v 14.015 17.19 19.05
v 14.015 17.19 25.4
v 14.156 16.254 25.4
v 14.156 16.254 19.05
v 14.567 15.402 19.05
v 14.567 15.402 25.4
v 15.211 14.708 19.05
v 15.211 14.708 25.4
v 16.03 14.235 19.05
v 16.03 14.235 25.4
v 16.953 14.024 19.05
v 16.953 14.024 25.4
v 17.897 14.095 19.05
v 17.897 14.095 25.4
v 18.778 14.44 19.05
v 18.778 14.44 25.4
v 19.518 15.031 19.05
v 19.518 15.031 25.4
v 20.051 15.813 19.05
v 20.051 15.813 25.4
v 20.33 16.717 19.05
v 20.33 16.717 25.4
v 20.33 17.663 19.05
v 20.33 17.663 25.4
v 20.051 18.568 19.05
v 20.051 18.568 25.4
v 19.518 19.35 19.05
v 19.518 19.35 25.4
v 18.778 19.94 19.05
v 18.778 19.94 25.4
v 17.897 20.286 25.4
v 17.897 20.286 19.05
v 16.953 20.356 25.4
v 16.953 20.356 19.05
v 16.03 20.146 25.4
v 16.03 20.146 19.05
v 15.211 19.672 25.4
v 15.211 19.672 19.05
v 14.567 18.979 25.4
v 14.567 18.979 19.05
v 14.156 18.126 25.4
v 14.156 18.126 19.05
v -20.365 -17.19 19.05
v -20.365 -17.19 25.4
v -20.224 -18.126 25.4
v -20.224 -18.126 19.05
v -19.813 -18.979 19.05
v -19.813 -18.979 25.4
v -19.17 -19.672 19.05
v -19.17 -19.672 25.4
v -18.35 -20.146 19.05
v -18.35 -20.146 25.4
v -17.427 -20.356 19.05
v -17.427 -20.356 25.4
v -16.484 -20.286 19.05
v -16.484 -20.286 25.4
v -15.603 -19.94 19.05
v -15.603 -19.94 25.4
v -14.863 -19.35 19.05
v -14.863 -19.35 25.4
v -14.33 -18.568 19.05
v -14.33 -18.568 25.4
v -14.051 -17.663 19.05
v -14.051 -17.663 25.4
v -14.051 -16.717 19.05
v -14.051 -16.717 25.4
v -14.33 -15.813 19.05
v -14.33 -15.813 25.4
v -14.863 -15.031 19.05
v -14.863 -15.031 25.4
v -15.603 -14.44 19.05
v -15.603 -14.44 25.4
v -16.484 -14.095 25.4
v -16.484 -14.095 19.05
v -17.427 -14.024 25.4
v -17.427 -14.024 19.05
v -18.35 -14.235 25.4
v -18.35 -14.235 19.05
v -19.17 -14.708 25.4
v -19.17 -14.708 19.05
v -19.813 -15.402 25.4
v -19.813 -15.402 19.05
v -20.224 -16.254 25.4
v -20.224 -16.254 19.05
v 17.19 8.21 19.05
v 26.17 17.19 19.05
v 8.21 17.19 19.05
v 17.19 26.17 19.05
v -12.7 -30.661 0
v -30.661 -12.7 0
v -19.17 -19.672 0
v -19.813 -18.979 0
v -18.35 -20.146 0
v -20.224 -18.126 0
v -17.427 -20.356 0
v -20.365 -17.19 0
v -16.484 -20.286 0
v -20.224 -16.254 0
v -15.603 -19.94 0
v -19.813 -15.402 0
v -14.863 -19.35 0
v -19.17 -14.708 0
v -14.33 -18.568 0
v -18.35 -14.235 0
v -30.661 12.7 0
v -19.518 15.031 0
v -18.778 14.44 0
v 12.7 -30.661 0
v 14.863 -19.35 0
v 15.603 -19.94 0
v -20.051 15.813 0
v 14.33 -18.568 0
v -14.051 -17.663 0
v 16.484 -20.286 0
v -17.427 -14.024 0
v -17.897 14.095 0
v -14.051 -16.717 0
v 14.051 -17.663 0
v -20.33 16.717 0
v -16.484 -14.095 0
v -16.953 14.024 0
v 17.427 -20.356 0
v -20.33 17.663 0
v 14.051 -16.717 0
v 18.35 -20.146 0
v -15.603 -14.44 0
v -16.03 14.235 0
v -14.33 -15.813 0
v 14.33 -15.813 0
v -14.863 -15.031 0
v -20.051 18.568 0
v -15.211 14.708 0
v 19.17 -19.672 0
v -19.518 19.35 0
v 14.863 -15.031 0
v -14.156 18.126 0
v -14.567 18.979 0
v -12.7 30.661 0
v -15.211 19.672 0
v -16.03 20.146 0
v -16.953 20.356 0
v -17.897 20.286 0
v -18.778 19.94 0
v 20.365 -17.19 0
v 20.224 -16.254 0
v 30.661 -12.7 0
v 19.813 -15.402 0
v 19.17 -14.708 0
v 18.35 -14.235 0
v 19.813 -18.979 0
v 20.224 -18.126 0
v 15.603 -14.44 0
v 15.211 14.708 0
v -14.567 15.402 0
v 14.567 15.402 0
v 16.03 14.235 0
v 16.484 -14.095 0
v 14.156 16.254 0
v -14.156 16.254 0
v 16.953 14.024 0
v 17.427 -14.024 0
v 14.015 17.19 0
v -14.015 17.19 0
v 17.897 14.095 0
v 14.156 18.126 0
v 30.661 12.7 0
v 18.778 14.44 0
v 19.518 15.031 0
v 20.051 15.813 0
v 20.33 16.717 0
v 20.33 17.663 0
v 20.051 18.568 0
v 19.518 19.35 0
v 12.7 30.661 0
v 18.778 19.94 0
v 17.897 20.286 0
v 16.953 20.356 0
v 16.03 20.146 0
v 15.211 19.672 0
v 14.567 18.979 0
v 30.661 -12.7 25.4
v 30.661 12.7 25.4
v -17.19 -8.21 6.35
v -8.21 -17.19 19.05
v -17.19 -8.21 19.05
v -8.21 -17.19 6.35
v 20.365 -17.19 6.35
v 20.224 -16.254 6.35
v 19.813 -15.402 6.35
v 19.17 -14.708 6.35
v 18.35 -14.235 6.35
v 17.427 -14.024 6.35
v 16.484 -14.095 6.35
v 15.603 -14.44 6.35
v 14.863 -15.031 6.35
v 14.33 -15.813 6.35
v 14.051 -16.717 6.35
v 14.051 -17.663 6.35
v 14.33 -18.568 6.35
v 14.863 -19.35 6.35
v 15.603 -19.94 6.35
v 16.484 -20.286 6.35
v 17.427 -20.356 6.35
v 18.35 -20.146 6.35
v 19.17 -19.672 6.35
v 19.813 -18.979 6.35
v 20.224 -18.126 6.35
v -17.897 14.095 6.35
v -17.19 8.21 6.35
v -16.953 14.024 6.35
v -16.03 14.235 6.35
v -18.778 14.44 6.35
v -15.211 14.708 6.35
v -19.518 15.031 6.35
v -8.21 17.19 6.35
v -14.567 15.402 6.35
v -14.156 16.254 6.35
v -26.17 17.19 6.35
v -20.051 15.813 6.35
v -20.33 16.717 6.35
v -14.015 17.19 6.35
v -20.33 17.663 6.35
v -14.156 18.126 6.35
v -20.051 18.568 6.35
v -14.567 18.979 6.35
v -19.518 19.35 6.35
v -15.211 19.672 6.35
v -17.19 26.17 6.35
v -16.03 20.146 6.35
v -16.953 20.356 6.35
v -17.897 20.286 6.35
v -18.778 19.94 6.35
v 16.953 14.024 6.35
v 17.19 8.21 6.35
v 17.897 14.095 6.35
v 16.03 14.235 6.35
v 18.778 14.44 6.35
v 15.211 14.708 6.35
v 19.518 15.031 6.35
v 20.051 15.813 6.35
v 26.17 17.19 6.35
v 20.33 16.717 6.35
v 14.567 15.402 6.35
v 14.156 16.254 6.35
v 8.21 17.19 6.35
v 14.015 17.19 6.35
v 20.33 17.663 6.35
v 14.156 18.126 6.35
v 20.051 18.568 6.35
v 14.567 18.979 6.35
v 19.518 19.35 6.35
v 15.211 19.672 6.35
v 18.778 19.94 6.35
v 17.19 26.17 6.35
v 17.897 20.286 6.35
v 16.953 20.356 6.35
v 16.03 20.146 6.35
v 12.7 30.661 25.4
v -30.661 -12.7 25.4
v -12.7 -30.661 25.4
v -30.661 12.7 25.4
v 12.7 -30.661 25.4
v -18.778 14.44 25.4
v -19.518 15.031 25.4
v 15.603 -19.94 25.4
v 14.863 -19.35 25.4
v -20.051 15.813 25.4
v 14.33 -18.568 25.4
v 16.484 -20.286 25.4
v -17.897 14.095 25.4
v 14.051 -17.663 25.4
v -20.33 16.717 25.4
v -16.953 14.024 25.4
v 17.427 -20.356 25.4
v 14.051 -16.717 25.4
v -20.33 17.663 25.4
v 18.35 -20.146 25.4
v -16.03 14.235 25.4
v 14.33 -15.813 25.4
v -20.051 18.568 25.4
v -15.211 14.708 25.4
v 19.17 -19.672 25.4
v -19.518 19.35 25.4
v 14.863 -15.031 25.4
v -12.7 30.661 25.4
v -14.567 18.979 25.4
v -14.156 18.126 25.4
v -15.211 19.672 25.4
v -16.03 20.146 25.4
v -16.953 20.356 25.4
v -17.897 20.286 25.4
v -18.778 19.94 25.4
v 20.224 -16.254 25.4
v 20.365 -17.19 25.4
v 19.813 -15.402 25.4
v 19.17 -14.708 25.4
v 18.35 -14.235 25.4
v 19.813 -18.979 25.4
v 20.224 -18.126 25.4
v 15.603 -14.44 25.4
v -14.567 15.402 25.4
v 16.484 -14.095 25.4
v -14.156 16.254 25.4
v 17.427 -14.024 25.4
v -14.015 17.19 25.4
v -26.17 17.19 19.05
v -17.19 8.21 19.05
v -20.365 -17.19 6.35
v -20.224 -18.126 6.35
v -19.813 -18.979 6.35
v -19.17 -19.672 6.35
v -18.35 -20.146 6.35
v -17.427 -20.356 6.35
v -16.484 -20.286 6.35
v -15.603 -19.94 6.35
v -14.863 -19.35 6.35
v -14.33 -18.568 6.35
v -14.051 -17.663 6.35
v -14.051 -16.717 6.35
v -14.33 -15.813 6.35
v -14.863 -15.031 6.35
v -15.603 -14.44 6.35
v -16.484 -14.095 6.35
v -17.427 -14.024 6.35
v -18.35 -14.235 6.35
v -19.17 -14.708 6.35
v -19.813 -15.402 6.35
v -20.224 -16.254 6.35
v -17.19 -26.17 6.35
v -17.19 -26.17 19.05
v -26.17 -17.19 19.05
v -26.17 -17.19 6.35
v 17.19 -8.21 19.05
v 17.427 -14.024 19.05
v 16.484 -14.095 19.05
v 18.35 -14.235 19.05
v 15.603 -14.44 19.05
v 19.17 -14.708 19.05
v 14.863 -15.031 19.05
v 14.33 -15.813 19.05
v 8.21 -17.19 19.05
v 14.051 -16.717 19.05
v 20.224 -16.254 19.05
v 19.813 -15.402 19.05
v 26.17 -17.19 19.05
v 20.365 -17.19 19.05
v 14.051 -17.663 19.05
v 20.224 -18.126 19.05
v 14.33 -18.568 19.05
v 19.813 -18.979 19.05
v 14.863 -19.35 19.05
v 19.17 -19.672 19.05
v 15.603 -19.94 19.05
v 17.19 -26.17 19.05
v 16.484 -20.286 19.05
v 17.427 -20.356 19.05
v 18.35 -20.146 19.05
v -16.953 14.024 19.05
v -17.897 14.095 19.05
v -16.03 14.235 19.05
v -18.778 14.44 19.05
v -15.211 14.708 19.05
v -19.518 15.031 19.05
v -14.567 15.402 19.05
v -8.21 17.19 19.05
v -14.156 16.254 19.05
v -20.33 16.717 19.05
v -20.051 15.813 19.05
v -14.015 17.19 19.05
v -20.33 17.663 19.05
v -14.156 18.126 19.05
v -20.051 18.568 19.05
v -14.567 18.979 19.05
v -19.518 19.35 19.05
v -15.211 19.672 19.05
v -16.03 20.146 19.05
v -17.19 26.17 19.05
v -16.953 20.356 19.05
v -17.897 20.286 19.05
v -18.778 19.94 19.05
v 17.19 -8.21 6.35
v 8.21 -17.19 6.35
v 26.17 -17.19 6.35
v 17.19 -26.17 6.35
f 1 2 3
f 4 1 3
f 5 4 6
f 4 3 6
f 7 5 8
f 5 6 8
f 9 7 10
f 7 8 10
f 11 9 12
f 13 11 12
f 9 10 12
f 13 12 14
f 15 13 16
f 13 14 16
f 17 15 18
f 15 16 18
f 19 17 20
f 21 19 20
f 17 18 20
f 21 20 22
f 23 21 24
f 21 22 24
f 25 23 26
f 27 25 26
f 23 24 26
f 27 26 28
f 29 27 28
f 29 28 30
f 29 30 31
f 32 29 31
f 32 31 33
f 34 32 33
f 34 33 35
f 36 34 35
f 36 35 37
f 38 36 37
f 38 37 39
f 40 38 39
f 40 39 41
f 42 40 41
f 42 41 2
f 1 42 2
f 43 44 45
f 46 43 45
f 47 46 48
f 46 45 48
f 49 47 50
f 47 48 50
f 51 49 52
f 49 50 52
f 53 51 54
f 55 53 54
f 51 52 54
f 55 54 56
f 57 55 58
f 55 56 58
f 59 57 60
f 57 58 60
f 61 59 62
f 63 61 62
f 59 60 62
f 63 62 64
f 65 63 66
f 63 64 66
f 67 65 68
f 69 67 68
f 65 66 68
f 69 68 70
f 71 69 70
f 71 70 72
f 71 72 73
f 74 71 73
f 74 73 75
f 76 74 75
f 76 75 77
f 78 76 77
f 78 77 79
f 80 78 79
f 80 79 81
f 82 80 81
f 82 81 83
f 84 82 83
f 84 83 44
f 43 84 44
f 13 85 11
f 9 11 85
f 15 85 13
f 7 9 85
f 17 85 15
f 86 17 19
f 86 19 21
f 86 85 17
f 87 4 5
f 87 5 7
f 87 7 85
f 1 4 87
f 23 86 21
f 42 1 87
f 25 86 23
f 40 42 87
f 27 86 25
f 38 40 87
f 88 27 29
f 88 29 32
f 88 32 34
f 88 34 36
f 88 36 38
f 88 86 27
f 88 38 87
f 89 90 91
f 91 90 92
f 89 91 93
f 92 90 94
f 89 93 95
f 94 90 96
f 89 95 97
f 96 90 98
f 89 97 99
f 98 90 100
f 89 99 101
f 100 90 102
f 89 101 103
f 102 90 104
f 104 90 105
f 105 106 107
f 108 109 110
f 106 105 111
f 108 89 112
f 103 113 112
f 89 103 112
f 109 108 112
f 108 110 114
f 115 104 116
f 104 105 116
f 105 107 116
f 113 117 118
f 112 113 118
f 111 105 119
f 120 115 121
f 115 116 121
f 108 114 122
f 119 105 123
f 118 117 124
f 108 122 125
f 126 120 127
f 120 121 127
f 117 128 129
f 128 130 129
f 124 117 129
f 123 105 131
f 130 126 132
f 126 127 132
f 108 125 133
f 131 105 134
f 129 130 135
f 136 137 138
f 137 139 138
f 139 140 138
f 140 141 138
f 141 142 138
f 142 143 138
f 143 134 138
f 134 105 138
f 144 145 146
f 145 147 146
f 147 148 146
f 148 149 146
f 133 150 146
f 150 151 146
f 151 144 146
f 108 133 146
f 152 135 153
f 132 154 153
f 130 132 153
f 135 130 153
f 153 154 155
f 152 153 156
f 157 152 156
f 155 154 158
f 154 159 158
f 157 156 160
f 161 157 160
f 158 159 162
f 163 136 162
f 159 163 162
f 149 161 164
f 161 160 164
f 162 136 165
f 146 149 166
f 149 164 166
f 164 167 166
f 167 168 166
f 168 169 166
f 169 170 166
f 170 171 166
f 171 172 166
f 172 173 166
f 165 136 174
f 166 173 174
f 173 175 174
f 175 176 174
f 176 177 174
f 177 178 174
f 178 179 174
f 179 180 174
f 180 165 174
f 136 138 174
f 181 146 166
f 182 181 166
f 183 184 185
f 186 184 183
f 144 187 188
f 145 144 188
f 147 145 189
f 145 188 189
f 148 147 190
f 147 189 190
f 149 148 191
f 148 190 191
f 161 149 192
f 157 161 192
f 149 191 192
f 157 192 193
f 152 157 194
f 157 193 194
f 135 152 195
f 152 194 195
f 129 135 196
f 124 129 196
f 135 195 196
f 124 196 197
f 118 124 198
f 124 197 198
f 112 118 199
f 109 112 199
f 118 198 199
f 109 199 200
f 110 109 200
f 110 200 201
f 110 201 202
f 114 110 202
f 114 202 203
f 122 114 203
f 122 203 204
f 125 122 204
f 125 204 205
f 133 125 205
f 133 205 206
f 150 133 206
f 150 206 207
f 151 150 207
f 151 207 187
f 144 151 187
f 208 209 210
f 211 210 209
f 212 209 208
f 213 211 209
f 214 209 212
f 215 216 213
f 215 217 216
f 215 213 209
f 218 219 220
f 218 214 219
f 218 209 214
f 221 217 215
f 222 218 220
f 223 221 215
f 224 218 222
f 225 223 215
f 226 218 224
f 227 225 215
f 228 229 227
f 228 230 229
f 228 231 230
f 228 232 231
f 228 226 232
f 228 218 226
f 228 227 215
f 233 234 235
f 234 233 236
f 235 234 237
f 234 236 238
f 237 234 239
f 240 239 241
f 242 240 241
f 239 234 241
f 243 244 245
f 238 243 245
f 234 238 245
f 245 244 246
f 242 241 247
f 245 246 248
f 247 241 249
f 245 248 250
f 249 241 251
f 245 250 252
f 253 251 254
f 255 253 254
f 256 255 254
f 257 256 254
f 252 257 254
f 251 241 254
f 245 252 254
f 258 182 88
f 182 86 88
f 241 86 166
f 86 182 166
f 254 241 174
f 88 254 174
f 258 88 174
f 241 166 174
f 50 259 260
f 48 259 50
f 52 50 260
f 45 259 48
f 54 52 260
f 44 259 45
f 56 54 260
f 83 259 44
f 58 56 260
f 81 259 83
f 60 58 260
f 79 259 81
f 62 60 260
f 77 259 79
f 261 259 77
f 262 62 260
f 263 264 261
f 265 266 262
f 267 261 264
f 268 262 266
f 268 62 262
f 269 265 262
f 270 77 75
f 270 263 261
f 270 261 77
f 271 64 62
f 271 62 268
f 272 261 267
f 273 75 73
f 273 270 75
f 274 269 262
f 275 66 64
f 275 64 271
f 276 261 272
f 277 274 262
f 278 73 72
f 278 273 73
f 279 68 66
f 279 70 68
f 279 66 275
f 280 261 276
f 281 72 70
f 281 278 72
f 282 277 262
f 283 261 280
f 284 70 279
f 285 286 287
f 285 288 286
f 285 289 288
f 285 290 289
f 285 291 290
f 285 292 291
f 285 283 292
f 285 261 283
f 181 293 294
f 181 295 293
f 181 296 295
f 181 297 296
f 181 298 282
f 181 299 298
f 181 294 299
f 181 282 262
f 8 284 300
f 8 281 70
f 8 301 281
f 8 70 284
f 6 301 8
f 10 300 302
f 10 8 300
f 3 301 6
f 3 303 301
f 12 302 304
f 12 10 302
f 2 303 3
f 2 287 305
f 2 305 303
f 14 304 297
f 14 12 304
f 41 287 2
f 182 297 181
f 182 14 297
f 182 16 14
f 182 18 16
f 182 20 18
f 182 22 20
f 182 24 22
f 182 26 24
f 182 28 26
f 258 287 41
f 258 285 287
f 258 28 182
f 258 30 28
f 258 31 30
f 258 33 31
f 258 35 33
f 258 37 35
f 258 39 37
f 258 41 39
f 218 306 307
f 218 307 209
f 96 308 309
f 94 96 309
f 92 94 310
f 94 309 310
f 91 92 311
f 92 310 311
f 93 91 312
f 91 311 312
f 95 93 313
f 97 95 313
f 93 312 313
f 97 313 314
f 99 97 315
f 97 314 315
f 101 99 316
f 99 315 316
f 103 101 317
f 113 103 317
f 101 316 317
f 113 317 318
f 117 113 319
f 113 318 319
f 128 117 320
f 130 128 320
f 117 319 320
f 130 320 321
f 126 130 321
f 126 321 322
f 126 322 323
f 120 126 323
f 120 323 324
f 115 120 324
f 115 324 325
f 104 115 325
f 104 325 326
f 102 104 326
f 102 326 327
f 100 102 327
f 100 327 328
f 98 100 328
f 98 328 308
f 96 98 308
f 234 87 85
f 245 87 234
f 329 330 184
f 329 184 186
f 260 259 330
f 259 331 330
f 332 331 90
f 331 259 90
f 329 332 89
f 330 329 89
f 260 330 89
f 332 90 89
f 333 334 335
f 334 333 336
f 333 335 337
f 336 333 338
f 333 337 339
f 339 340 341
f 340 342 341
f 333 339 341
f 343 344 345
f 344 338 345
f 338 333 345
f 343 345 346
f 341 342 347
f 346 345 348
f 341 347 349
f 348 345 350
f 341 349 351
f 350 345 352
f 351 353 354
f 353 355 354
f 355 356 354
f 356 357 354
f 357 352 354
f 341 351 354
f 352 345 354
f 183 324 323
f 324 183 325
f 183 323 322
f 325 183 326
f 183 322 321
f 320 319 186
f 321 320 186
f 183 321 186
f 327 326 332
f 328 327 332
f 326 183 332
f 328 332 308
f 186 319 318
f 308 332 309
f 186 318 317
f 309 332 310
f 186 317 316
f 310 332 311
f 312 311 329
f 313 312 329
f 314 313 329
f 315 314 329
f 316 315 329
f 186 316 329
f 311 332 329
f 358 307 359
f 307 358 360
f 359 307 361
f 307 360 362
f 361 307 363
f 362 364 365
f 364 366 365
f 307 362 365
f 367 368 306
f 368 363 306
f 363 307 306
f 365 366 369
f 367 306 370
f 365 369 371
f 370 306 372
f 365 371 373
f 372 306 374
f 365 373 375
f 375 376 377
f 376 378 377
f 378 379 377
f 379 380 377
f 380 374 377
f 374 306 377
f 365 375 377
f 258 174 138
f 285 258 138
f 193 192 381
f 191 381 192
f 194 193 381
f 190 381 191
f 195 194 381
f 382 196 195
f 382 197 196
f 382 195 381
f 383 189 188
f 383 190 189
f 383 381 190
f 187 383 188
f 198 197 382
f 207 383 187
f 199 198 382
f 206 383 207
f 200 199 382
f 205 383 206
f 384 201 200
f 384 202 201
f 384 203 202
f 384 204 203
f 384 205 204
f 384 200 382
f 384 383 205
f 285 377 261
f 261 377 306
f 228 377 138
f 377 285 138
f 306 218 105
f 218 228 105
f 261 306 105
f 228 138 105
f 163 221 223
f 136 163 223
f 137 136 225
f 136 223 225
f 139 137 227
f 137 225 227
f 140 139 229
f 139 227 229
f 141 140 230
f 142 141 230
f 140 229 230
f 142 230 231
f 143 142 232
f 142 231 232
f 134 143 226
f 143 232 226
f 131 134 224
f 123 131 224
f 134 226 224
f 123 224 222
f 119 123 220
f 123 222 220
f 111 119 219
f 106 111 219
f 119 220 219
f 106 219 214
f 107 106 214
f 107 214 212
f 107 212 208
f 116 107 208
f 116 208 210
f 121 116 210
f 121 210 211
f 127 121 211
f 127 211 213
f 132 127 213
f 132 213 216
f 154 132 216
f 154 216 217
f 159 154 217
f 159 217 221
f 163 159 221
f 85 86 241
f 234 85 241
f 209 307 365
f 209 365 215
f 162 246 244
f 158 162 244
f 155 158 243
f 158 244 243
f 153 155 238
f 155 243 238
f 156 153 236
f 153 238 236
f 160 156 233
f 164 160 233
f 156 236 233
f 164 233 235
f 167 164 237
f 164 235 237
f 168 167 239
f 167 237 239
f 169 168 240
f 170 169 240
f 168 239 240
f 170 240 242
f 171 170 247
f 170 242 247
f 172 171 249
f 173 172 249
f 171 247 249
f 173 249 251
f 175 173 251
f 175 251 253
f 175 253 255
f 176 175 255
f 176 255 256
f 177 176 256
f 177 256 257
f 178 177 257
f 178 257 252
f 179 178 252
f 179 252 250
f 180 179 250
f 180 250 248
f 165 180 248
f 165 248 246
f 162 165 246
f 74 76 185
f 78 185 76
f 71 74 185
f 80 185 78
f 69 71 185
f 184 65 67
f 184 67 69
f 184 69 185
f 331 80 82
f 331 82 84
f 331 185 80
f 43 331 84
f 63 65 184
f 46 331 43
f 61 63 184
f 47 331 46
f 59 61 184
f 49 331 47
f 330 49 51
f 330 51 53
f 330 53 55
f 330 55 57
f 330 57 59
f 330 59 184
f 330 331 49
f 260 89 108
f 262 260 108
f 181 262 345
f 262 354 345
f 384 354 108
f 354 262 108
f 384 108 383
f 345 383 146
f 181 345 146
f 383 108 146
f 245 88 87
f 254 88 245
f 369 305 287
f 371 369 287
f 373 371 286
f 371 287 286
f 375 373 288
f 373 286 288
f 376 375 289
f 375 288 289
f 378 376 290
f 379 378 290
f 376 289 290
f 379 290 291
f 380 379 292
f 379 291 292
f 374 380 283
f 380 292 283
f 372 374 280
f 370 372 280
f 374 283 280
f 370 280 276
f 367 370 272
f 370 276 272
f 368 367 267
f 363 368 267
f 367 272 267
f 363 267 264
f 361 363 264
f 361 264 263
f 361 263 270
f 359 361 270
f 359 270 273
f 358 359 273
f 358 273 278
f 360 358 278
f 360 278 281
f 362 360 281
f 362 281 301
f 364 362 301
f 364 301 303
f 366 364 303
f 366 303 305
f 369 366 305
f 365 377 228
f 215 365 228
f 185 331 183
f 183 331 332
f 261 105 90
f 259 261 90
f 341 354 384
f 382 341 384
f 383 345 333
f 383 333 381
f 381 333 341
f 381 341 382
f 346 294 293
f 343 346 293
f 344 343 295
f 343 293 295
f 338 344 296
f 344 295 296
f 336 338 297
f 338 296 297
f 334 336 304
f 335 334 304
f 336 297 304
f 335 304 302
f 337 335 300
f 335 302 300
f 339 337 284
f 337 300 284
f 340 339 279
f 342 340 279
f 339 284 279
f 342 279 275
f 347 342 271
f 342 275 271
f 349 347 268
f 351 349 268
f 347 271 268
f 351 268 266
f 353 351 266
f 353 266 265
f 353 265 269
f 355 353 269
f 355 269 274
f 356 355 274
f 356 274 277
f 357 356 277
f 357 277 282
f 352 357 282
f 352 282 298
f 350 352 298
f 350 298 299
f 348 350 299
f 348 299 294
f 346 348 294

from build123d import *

# Parameters (mm, degrees)
BOSS_EXTRUDE1_DEPTH     = 25.4
SKETCH2_W               = 12.7
SKETCH2_H               = 12.7
CUT_EXTRUDE1_DEPTH      = 12.7
MIRROR2_COPY_1_SKETCH_W = 12.7
MIRROR2_COPY_1_SKETCH_H = 12.7
MIRROR2_COPY_1_DEPTH    = 12.7
SKETCH3_R               = 3.175
CUT_EXTRUDE2_DEPTH      = 51.252303648


with BuildPart() as part:
    # Sketch1 → Boss-Extrude1 (new body)
    with BuildSketch(Plane.XY):
        Polygon((-30.660512242, 12.7), (-30.660512242, -12.7), (-12.7, -30.660512242), (12.7, -30.660512242), (30.660512242, -12.7), (30.660512242, 12.7), (12.7, 30.660512242), (-12.7, 30.660512242), align=None)
    extrude(amount=BOSS_EXTRUDE1_DEPTH)

    # Sketch2 → Cut-Extrude1 (cut)
    with BuildSketch(Plane(origin=(21.680256121, 21.680256121, 0), x_dir=(0, 0, -1), z_dir=(0.7071067811865479, 0.7071067811865472, 0))):
        with Locations((-12.7, 0)):
            Rectangle(SKETCH2_W, SKETCH2_H)
    cut_extrude1 = extrude(amount=-CUT_EXTRUDE1_DEPTH, mode=Mode.SUBTRACT)

    # Mirror1: Cut-Extrude1 across plane
    add(cut_extrude1.mirror(Plane(origin=(0, 0, 0), x_dir=(0, 0, 1), z_dir=(1, 0, 0))), mode=Mode.SUBTRACT)

    # Mirror2: Cut-Extrude1 across plane
    add(cut_extrude1.mirror(Plane.ZX), mode=Mode.SUBTRACT)

    # Mirror2 copy 1 sketch → Mirror2 copy 1 (cut)
    with BuildSketch(Plane(origin=(-21.680256121, -21.680256121, 0), x_dir=(0, 0, -1), z_dir=(-0.7071067811865472, -0.7071067811865479, 0))):
        with Locations((-12.7, 0)):
            Rectangle(MIRROR2_COPY_1_SKETCH_W, MIRROR2_COPY_1_SKETCH_H)
    extrude(amount=-MIRROR2_COPY_1_DEPTH, mode=Mode.SUBTRACT)

    # Sketch3 → Cut-Extrude2 (cut, through all)
    with BuildSketch(Plane.XY.offset(25.4)):
        with Locations((-17.190128061, 17.190128061)):
            Circle(SKETCH3_R)
        with Locations(Location((-17.190128061, -17.190128061, 0), (0, 0, 180))):
            Circle(SKETCH3_R)
        with Locations((17.190128061, -17.190128061)):
            Circle(SKETCH3_R)
        with Locations(Location((17.190128061, 17.190128061, 0), (0, 0, 180))):
            Circle(SKETCH3_R)
    extrude(amount=-CUT_EXTRUDE2_DEPTH, mode=Mode.SUBTRACT)


solid = part.part
